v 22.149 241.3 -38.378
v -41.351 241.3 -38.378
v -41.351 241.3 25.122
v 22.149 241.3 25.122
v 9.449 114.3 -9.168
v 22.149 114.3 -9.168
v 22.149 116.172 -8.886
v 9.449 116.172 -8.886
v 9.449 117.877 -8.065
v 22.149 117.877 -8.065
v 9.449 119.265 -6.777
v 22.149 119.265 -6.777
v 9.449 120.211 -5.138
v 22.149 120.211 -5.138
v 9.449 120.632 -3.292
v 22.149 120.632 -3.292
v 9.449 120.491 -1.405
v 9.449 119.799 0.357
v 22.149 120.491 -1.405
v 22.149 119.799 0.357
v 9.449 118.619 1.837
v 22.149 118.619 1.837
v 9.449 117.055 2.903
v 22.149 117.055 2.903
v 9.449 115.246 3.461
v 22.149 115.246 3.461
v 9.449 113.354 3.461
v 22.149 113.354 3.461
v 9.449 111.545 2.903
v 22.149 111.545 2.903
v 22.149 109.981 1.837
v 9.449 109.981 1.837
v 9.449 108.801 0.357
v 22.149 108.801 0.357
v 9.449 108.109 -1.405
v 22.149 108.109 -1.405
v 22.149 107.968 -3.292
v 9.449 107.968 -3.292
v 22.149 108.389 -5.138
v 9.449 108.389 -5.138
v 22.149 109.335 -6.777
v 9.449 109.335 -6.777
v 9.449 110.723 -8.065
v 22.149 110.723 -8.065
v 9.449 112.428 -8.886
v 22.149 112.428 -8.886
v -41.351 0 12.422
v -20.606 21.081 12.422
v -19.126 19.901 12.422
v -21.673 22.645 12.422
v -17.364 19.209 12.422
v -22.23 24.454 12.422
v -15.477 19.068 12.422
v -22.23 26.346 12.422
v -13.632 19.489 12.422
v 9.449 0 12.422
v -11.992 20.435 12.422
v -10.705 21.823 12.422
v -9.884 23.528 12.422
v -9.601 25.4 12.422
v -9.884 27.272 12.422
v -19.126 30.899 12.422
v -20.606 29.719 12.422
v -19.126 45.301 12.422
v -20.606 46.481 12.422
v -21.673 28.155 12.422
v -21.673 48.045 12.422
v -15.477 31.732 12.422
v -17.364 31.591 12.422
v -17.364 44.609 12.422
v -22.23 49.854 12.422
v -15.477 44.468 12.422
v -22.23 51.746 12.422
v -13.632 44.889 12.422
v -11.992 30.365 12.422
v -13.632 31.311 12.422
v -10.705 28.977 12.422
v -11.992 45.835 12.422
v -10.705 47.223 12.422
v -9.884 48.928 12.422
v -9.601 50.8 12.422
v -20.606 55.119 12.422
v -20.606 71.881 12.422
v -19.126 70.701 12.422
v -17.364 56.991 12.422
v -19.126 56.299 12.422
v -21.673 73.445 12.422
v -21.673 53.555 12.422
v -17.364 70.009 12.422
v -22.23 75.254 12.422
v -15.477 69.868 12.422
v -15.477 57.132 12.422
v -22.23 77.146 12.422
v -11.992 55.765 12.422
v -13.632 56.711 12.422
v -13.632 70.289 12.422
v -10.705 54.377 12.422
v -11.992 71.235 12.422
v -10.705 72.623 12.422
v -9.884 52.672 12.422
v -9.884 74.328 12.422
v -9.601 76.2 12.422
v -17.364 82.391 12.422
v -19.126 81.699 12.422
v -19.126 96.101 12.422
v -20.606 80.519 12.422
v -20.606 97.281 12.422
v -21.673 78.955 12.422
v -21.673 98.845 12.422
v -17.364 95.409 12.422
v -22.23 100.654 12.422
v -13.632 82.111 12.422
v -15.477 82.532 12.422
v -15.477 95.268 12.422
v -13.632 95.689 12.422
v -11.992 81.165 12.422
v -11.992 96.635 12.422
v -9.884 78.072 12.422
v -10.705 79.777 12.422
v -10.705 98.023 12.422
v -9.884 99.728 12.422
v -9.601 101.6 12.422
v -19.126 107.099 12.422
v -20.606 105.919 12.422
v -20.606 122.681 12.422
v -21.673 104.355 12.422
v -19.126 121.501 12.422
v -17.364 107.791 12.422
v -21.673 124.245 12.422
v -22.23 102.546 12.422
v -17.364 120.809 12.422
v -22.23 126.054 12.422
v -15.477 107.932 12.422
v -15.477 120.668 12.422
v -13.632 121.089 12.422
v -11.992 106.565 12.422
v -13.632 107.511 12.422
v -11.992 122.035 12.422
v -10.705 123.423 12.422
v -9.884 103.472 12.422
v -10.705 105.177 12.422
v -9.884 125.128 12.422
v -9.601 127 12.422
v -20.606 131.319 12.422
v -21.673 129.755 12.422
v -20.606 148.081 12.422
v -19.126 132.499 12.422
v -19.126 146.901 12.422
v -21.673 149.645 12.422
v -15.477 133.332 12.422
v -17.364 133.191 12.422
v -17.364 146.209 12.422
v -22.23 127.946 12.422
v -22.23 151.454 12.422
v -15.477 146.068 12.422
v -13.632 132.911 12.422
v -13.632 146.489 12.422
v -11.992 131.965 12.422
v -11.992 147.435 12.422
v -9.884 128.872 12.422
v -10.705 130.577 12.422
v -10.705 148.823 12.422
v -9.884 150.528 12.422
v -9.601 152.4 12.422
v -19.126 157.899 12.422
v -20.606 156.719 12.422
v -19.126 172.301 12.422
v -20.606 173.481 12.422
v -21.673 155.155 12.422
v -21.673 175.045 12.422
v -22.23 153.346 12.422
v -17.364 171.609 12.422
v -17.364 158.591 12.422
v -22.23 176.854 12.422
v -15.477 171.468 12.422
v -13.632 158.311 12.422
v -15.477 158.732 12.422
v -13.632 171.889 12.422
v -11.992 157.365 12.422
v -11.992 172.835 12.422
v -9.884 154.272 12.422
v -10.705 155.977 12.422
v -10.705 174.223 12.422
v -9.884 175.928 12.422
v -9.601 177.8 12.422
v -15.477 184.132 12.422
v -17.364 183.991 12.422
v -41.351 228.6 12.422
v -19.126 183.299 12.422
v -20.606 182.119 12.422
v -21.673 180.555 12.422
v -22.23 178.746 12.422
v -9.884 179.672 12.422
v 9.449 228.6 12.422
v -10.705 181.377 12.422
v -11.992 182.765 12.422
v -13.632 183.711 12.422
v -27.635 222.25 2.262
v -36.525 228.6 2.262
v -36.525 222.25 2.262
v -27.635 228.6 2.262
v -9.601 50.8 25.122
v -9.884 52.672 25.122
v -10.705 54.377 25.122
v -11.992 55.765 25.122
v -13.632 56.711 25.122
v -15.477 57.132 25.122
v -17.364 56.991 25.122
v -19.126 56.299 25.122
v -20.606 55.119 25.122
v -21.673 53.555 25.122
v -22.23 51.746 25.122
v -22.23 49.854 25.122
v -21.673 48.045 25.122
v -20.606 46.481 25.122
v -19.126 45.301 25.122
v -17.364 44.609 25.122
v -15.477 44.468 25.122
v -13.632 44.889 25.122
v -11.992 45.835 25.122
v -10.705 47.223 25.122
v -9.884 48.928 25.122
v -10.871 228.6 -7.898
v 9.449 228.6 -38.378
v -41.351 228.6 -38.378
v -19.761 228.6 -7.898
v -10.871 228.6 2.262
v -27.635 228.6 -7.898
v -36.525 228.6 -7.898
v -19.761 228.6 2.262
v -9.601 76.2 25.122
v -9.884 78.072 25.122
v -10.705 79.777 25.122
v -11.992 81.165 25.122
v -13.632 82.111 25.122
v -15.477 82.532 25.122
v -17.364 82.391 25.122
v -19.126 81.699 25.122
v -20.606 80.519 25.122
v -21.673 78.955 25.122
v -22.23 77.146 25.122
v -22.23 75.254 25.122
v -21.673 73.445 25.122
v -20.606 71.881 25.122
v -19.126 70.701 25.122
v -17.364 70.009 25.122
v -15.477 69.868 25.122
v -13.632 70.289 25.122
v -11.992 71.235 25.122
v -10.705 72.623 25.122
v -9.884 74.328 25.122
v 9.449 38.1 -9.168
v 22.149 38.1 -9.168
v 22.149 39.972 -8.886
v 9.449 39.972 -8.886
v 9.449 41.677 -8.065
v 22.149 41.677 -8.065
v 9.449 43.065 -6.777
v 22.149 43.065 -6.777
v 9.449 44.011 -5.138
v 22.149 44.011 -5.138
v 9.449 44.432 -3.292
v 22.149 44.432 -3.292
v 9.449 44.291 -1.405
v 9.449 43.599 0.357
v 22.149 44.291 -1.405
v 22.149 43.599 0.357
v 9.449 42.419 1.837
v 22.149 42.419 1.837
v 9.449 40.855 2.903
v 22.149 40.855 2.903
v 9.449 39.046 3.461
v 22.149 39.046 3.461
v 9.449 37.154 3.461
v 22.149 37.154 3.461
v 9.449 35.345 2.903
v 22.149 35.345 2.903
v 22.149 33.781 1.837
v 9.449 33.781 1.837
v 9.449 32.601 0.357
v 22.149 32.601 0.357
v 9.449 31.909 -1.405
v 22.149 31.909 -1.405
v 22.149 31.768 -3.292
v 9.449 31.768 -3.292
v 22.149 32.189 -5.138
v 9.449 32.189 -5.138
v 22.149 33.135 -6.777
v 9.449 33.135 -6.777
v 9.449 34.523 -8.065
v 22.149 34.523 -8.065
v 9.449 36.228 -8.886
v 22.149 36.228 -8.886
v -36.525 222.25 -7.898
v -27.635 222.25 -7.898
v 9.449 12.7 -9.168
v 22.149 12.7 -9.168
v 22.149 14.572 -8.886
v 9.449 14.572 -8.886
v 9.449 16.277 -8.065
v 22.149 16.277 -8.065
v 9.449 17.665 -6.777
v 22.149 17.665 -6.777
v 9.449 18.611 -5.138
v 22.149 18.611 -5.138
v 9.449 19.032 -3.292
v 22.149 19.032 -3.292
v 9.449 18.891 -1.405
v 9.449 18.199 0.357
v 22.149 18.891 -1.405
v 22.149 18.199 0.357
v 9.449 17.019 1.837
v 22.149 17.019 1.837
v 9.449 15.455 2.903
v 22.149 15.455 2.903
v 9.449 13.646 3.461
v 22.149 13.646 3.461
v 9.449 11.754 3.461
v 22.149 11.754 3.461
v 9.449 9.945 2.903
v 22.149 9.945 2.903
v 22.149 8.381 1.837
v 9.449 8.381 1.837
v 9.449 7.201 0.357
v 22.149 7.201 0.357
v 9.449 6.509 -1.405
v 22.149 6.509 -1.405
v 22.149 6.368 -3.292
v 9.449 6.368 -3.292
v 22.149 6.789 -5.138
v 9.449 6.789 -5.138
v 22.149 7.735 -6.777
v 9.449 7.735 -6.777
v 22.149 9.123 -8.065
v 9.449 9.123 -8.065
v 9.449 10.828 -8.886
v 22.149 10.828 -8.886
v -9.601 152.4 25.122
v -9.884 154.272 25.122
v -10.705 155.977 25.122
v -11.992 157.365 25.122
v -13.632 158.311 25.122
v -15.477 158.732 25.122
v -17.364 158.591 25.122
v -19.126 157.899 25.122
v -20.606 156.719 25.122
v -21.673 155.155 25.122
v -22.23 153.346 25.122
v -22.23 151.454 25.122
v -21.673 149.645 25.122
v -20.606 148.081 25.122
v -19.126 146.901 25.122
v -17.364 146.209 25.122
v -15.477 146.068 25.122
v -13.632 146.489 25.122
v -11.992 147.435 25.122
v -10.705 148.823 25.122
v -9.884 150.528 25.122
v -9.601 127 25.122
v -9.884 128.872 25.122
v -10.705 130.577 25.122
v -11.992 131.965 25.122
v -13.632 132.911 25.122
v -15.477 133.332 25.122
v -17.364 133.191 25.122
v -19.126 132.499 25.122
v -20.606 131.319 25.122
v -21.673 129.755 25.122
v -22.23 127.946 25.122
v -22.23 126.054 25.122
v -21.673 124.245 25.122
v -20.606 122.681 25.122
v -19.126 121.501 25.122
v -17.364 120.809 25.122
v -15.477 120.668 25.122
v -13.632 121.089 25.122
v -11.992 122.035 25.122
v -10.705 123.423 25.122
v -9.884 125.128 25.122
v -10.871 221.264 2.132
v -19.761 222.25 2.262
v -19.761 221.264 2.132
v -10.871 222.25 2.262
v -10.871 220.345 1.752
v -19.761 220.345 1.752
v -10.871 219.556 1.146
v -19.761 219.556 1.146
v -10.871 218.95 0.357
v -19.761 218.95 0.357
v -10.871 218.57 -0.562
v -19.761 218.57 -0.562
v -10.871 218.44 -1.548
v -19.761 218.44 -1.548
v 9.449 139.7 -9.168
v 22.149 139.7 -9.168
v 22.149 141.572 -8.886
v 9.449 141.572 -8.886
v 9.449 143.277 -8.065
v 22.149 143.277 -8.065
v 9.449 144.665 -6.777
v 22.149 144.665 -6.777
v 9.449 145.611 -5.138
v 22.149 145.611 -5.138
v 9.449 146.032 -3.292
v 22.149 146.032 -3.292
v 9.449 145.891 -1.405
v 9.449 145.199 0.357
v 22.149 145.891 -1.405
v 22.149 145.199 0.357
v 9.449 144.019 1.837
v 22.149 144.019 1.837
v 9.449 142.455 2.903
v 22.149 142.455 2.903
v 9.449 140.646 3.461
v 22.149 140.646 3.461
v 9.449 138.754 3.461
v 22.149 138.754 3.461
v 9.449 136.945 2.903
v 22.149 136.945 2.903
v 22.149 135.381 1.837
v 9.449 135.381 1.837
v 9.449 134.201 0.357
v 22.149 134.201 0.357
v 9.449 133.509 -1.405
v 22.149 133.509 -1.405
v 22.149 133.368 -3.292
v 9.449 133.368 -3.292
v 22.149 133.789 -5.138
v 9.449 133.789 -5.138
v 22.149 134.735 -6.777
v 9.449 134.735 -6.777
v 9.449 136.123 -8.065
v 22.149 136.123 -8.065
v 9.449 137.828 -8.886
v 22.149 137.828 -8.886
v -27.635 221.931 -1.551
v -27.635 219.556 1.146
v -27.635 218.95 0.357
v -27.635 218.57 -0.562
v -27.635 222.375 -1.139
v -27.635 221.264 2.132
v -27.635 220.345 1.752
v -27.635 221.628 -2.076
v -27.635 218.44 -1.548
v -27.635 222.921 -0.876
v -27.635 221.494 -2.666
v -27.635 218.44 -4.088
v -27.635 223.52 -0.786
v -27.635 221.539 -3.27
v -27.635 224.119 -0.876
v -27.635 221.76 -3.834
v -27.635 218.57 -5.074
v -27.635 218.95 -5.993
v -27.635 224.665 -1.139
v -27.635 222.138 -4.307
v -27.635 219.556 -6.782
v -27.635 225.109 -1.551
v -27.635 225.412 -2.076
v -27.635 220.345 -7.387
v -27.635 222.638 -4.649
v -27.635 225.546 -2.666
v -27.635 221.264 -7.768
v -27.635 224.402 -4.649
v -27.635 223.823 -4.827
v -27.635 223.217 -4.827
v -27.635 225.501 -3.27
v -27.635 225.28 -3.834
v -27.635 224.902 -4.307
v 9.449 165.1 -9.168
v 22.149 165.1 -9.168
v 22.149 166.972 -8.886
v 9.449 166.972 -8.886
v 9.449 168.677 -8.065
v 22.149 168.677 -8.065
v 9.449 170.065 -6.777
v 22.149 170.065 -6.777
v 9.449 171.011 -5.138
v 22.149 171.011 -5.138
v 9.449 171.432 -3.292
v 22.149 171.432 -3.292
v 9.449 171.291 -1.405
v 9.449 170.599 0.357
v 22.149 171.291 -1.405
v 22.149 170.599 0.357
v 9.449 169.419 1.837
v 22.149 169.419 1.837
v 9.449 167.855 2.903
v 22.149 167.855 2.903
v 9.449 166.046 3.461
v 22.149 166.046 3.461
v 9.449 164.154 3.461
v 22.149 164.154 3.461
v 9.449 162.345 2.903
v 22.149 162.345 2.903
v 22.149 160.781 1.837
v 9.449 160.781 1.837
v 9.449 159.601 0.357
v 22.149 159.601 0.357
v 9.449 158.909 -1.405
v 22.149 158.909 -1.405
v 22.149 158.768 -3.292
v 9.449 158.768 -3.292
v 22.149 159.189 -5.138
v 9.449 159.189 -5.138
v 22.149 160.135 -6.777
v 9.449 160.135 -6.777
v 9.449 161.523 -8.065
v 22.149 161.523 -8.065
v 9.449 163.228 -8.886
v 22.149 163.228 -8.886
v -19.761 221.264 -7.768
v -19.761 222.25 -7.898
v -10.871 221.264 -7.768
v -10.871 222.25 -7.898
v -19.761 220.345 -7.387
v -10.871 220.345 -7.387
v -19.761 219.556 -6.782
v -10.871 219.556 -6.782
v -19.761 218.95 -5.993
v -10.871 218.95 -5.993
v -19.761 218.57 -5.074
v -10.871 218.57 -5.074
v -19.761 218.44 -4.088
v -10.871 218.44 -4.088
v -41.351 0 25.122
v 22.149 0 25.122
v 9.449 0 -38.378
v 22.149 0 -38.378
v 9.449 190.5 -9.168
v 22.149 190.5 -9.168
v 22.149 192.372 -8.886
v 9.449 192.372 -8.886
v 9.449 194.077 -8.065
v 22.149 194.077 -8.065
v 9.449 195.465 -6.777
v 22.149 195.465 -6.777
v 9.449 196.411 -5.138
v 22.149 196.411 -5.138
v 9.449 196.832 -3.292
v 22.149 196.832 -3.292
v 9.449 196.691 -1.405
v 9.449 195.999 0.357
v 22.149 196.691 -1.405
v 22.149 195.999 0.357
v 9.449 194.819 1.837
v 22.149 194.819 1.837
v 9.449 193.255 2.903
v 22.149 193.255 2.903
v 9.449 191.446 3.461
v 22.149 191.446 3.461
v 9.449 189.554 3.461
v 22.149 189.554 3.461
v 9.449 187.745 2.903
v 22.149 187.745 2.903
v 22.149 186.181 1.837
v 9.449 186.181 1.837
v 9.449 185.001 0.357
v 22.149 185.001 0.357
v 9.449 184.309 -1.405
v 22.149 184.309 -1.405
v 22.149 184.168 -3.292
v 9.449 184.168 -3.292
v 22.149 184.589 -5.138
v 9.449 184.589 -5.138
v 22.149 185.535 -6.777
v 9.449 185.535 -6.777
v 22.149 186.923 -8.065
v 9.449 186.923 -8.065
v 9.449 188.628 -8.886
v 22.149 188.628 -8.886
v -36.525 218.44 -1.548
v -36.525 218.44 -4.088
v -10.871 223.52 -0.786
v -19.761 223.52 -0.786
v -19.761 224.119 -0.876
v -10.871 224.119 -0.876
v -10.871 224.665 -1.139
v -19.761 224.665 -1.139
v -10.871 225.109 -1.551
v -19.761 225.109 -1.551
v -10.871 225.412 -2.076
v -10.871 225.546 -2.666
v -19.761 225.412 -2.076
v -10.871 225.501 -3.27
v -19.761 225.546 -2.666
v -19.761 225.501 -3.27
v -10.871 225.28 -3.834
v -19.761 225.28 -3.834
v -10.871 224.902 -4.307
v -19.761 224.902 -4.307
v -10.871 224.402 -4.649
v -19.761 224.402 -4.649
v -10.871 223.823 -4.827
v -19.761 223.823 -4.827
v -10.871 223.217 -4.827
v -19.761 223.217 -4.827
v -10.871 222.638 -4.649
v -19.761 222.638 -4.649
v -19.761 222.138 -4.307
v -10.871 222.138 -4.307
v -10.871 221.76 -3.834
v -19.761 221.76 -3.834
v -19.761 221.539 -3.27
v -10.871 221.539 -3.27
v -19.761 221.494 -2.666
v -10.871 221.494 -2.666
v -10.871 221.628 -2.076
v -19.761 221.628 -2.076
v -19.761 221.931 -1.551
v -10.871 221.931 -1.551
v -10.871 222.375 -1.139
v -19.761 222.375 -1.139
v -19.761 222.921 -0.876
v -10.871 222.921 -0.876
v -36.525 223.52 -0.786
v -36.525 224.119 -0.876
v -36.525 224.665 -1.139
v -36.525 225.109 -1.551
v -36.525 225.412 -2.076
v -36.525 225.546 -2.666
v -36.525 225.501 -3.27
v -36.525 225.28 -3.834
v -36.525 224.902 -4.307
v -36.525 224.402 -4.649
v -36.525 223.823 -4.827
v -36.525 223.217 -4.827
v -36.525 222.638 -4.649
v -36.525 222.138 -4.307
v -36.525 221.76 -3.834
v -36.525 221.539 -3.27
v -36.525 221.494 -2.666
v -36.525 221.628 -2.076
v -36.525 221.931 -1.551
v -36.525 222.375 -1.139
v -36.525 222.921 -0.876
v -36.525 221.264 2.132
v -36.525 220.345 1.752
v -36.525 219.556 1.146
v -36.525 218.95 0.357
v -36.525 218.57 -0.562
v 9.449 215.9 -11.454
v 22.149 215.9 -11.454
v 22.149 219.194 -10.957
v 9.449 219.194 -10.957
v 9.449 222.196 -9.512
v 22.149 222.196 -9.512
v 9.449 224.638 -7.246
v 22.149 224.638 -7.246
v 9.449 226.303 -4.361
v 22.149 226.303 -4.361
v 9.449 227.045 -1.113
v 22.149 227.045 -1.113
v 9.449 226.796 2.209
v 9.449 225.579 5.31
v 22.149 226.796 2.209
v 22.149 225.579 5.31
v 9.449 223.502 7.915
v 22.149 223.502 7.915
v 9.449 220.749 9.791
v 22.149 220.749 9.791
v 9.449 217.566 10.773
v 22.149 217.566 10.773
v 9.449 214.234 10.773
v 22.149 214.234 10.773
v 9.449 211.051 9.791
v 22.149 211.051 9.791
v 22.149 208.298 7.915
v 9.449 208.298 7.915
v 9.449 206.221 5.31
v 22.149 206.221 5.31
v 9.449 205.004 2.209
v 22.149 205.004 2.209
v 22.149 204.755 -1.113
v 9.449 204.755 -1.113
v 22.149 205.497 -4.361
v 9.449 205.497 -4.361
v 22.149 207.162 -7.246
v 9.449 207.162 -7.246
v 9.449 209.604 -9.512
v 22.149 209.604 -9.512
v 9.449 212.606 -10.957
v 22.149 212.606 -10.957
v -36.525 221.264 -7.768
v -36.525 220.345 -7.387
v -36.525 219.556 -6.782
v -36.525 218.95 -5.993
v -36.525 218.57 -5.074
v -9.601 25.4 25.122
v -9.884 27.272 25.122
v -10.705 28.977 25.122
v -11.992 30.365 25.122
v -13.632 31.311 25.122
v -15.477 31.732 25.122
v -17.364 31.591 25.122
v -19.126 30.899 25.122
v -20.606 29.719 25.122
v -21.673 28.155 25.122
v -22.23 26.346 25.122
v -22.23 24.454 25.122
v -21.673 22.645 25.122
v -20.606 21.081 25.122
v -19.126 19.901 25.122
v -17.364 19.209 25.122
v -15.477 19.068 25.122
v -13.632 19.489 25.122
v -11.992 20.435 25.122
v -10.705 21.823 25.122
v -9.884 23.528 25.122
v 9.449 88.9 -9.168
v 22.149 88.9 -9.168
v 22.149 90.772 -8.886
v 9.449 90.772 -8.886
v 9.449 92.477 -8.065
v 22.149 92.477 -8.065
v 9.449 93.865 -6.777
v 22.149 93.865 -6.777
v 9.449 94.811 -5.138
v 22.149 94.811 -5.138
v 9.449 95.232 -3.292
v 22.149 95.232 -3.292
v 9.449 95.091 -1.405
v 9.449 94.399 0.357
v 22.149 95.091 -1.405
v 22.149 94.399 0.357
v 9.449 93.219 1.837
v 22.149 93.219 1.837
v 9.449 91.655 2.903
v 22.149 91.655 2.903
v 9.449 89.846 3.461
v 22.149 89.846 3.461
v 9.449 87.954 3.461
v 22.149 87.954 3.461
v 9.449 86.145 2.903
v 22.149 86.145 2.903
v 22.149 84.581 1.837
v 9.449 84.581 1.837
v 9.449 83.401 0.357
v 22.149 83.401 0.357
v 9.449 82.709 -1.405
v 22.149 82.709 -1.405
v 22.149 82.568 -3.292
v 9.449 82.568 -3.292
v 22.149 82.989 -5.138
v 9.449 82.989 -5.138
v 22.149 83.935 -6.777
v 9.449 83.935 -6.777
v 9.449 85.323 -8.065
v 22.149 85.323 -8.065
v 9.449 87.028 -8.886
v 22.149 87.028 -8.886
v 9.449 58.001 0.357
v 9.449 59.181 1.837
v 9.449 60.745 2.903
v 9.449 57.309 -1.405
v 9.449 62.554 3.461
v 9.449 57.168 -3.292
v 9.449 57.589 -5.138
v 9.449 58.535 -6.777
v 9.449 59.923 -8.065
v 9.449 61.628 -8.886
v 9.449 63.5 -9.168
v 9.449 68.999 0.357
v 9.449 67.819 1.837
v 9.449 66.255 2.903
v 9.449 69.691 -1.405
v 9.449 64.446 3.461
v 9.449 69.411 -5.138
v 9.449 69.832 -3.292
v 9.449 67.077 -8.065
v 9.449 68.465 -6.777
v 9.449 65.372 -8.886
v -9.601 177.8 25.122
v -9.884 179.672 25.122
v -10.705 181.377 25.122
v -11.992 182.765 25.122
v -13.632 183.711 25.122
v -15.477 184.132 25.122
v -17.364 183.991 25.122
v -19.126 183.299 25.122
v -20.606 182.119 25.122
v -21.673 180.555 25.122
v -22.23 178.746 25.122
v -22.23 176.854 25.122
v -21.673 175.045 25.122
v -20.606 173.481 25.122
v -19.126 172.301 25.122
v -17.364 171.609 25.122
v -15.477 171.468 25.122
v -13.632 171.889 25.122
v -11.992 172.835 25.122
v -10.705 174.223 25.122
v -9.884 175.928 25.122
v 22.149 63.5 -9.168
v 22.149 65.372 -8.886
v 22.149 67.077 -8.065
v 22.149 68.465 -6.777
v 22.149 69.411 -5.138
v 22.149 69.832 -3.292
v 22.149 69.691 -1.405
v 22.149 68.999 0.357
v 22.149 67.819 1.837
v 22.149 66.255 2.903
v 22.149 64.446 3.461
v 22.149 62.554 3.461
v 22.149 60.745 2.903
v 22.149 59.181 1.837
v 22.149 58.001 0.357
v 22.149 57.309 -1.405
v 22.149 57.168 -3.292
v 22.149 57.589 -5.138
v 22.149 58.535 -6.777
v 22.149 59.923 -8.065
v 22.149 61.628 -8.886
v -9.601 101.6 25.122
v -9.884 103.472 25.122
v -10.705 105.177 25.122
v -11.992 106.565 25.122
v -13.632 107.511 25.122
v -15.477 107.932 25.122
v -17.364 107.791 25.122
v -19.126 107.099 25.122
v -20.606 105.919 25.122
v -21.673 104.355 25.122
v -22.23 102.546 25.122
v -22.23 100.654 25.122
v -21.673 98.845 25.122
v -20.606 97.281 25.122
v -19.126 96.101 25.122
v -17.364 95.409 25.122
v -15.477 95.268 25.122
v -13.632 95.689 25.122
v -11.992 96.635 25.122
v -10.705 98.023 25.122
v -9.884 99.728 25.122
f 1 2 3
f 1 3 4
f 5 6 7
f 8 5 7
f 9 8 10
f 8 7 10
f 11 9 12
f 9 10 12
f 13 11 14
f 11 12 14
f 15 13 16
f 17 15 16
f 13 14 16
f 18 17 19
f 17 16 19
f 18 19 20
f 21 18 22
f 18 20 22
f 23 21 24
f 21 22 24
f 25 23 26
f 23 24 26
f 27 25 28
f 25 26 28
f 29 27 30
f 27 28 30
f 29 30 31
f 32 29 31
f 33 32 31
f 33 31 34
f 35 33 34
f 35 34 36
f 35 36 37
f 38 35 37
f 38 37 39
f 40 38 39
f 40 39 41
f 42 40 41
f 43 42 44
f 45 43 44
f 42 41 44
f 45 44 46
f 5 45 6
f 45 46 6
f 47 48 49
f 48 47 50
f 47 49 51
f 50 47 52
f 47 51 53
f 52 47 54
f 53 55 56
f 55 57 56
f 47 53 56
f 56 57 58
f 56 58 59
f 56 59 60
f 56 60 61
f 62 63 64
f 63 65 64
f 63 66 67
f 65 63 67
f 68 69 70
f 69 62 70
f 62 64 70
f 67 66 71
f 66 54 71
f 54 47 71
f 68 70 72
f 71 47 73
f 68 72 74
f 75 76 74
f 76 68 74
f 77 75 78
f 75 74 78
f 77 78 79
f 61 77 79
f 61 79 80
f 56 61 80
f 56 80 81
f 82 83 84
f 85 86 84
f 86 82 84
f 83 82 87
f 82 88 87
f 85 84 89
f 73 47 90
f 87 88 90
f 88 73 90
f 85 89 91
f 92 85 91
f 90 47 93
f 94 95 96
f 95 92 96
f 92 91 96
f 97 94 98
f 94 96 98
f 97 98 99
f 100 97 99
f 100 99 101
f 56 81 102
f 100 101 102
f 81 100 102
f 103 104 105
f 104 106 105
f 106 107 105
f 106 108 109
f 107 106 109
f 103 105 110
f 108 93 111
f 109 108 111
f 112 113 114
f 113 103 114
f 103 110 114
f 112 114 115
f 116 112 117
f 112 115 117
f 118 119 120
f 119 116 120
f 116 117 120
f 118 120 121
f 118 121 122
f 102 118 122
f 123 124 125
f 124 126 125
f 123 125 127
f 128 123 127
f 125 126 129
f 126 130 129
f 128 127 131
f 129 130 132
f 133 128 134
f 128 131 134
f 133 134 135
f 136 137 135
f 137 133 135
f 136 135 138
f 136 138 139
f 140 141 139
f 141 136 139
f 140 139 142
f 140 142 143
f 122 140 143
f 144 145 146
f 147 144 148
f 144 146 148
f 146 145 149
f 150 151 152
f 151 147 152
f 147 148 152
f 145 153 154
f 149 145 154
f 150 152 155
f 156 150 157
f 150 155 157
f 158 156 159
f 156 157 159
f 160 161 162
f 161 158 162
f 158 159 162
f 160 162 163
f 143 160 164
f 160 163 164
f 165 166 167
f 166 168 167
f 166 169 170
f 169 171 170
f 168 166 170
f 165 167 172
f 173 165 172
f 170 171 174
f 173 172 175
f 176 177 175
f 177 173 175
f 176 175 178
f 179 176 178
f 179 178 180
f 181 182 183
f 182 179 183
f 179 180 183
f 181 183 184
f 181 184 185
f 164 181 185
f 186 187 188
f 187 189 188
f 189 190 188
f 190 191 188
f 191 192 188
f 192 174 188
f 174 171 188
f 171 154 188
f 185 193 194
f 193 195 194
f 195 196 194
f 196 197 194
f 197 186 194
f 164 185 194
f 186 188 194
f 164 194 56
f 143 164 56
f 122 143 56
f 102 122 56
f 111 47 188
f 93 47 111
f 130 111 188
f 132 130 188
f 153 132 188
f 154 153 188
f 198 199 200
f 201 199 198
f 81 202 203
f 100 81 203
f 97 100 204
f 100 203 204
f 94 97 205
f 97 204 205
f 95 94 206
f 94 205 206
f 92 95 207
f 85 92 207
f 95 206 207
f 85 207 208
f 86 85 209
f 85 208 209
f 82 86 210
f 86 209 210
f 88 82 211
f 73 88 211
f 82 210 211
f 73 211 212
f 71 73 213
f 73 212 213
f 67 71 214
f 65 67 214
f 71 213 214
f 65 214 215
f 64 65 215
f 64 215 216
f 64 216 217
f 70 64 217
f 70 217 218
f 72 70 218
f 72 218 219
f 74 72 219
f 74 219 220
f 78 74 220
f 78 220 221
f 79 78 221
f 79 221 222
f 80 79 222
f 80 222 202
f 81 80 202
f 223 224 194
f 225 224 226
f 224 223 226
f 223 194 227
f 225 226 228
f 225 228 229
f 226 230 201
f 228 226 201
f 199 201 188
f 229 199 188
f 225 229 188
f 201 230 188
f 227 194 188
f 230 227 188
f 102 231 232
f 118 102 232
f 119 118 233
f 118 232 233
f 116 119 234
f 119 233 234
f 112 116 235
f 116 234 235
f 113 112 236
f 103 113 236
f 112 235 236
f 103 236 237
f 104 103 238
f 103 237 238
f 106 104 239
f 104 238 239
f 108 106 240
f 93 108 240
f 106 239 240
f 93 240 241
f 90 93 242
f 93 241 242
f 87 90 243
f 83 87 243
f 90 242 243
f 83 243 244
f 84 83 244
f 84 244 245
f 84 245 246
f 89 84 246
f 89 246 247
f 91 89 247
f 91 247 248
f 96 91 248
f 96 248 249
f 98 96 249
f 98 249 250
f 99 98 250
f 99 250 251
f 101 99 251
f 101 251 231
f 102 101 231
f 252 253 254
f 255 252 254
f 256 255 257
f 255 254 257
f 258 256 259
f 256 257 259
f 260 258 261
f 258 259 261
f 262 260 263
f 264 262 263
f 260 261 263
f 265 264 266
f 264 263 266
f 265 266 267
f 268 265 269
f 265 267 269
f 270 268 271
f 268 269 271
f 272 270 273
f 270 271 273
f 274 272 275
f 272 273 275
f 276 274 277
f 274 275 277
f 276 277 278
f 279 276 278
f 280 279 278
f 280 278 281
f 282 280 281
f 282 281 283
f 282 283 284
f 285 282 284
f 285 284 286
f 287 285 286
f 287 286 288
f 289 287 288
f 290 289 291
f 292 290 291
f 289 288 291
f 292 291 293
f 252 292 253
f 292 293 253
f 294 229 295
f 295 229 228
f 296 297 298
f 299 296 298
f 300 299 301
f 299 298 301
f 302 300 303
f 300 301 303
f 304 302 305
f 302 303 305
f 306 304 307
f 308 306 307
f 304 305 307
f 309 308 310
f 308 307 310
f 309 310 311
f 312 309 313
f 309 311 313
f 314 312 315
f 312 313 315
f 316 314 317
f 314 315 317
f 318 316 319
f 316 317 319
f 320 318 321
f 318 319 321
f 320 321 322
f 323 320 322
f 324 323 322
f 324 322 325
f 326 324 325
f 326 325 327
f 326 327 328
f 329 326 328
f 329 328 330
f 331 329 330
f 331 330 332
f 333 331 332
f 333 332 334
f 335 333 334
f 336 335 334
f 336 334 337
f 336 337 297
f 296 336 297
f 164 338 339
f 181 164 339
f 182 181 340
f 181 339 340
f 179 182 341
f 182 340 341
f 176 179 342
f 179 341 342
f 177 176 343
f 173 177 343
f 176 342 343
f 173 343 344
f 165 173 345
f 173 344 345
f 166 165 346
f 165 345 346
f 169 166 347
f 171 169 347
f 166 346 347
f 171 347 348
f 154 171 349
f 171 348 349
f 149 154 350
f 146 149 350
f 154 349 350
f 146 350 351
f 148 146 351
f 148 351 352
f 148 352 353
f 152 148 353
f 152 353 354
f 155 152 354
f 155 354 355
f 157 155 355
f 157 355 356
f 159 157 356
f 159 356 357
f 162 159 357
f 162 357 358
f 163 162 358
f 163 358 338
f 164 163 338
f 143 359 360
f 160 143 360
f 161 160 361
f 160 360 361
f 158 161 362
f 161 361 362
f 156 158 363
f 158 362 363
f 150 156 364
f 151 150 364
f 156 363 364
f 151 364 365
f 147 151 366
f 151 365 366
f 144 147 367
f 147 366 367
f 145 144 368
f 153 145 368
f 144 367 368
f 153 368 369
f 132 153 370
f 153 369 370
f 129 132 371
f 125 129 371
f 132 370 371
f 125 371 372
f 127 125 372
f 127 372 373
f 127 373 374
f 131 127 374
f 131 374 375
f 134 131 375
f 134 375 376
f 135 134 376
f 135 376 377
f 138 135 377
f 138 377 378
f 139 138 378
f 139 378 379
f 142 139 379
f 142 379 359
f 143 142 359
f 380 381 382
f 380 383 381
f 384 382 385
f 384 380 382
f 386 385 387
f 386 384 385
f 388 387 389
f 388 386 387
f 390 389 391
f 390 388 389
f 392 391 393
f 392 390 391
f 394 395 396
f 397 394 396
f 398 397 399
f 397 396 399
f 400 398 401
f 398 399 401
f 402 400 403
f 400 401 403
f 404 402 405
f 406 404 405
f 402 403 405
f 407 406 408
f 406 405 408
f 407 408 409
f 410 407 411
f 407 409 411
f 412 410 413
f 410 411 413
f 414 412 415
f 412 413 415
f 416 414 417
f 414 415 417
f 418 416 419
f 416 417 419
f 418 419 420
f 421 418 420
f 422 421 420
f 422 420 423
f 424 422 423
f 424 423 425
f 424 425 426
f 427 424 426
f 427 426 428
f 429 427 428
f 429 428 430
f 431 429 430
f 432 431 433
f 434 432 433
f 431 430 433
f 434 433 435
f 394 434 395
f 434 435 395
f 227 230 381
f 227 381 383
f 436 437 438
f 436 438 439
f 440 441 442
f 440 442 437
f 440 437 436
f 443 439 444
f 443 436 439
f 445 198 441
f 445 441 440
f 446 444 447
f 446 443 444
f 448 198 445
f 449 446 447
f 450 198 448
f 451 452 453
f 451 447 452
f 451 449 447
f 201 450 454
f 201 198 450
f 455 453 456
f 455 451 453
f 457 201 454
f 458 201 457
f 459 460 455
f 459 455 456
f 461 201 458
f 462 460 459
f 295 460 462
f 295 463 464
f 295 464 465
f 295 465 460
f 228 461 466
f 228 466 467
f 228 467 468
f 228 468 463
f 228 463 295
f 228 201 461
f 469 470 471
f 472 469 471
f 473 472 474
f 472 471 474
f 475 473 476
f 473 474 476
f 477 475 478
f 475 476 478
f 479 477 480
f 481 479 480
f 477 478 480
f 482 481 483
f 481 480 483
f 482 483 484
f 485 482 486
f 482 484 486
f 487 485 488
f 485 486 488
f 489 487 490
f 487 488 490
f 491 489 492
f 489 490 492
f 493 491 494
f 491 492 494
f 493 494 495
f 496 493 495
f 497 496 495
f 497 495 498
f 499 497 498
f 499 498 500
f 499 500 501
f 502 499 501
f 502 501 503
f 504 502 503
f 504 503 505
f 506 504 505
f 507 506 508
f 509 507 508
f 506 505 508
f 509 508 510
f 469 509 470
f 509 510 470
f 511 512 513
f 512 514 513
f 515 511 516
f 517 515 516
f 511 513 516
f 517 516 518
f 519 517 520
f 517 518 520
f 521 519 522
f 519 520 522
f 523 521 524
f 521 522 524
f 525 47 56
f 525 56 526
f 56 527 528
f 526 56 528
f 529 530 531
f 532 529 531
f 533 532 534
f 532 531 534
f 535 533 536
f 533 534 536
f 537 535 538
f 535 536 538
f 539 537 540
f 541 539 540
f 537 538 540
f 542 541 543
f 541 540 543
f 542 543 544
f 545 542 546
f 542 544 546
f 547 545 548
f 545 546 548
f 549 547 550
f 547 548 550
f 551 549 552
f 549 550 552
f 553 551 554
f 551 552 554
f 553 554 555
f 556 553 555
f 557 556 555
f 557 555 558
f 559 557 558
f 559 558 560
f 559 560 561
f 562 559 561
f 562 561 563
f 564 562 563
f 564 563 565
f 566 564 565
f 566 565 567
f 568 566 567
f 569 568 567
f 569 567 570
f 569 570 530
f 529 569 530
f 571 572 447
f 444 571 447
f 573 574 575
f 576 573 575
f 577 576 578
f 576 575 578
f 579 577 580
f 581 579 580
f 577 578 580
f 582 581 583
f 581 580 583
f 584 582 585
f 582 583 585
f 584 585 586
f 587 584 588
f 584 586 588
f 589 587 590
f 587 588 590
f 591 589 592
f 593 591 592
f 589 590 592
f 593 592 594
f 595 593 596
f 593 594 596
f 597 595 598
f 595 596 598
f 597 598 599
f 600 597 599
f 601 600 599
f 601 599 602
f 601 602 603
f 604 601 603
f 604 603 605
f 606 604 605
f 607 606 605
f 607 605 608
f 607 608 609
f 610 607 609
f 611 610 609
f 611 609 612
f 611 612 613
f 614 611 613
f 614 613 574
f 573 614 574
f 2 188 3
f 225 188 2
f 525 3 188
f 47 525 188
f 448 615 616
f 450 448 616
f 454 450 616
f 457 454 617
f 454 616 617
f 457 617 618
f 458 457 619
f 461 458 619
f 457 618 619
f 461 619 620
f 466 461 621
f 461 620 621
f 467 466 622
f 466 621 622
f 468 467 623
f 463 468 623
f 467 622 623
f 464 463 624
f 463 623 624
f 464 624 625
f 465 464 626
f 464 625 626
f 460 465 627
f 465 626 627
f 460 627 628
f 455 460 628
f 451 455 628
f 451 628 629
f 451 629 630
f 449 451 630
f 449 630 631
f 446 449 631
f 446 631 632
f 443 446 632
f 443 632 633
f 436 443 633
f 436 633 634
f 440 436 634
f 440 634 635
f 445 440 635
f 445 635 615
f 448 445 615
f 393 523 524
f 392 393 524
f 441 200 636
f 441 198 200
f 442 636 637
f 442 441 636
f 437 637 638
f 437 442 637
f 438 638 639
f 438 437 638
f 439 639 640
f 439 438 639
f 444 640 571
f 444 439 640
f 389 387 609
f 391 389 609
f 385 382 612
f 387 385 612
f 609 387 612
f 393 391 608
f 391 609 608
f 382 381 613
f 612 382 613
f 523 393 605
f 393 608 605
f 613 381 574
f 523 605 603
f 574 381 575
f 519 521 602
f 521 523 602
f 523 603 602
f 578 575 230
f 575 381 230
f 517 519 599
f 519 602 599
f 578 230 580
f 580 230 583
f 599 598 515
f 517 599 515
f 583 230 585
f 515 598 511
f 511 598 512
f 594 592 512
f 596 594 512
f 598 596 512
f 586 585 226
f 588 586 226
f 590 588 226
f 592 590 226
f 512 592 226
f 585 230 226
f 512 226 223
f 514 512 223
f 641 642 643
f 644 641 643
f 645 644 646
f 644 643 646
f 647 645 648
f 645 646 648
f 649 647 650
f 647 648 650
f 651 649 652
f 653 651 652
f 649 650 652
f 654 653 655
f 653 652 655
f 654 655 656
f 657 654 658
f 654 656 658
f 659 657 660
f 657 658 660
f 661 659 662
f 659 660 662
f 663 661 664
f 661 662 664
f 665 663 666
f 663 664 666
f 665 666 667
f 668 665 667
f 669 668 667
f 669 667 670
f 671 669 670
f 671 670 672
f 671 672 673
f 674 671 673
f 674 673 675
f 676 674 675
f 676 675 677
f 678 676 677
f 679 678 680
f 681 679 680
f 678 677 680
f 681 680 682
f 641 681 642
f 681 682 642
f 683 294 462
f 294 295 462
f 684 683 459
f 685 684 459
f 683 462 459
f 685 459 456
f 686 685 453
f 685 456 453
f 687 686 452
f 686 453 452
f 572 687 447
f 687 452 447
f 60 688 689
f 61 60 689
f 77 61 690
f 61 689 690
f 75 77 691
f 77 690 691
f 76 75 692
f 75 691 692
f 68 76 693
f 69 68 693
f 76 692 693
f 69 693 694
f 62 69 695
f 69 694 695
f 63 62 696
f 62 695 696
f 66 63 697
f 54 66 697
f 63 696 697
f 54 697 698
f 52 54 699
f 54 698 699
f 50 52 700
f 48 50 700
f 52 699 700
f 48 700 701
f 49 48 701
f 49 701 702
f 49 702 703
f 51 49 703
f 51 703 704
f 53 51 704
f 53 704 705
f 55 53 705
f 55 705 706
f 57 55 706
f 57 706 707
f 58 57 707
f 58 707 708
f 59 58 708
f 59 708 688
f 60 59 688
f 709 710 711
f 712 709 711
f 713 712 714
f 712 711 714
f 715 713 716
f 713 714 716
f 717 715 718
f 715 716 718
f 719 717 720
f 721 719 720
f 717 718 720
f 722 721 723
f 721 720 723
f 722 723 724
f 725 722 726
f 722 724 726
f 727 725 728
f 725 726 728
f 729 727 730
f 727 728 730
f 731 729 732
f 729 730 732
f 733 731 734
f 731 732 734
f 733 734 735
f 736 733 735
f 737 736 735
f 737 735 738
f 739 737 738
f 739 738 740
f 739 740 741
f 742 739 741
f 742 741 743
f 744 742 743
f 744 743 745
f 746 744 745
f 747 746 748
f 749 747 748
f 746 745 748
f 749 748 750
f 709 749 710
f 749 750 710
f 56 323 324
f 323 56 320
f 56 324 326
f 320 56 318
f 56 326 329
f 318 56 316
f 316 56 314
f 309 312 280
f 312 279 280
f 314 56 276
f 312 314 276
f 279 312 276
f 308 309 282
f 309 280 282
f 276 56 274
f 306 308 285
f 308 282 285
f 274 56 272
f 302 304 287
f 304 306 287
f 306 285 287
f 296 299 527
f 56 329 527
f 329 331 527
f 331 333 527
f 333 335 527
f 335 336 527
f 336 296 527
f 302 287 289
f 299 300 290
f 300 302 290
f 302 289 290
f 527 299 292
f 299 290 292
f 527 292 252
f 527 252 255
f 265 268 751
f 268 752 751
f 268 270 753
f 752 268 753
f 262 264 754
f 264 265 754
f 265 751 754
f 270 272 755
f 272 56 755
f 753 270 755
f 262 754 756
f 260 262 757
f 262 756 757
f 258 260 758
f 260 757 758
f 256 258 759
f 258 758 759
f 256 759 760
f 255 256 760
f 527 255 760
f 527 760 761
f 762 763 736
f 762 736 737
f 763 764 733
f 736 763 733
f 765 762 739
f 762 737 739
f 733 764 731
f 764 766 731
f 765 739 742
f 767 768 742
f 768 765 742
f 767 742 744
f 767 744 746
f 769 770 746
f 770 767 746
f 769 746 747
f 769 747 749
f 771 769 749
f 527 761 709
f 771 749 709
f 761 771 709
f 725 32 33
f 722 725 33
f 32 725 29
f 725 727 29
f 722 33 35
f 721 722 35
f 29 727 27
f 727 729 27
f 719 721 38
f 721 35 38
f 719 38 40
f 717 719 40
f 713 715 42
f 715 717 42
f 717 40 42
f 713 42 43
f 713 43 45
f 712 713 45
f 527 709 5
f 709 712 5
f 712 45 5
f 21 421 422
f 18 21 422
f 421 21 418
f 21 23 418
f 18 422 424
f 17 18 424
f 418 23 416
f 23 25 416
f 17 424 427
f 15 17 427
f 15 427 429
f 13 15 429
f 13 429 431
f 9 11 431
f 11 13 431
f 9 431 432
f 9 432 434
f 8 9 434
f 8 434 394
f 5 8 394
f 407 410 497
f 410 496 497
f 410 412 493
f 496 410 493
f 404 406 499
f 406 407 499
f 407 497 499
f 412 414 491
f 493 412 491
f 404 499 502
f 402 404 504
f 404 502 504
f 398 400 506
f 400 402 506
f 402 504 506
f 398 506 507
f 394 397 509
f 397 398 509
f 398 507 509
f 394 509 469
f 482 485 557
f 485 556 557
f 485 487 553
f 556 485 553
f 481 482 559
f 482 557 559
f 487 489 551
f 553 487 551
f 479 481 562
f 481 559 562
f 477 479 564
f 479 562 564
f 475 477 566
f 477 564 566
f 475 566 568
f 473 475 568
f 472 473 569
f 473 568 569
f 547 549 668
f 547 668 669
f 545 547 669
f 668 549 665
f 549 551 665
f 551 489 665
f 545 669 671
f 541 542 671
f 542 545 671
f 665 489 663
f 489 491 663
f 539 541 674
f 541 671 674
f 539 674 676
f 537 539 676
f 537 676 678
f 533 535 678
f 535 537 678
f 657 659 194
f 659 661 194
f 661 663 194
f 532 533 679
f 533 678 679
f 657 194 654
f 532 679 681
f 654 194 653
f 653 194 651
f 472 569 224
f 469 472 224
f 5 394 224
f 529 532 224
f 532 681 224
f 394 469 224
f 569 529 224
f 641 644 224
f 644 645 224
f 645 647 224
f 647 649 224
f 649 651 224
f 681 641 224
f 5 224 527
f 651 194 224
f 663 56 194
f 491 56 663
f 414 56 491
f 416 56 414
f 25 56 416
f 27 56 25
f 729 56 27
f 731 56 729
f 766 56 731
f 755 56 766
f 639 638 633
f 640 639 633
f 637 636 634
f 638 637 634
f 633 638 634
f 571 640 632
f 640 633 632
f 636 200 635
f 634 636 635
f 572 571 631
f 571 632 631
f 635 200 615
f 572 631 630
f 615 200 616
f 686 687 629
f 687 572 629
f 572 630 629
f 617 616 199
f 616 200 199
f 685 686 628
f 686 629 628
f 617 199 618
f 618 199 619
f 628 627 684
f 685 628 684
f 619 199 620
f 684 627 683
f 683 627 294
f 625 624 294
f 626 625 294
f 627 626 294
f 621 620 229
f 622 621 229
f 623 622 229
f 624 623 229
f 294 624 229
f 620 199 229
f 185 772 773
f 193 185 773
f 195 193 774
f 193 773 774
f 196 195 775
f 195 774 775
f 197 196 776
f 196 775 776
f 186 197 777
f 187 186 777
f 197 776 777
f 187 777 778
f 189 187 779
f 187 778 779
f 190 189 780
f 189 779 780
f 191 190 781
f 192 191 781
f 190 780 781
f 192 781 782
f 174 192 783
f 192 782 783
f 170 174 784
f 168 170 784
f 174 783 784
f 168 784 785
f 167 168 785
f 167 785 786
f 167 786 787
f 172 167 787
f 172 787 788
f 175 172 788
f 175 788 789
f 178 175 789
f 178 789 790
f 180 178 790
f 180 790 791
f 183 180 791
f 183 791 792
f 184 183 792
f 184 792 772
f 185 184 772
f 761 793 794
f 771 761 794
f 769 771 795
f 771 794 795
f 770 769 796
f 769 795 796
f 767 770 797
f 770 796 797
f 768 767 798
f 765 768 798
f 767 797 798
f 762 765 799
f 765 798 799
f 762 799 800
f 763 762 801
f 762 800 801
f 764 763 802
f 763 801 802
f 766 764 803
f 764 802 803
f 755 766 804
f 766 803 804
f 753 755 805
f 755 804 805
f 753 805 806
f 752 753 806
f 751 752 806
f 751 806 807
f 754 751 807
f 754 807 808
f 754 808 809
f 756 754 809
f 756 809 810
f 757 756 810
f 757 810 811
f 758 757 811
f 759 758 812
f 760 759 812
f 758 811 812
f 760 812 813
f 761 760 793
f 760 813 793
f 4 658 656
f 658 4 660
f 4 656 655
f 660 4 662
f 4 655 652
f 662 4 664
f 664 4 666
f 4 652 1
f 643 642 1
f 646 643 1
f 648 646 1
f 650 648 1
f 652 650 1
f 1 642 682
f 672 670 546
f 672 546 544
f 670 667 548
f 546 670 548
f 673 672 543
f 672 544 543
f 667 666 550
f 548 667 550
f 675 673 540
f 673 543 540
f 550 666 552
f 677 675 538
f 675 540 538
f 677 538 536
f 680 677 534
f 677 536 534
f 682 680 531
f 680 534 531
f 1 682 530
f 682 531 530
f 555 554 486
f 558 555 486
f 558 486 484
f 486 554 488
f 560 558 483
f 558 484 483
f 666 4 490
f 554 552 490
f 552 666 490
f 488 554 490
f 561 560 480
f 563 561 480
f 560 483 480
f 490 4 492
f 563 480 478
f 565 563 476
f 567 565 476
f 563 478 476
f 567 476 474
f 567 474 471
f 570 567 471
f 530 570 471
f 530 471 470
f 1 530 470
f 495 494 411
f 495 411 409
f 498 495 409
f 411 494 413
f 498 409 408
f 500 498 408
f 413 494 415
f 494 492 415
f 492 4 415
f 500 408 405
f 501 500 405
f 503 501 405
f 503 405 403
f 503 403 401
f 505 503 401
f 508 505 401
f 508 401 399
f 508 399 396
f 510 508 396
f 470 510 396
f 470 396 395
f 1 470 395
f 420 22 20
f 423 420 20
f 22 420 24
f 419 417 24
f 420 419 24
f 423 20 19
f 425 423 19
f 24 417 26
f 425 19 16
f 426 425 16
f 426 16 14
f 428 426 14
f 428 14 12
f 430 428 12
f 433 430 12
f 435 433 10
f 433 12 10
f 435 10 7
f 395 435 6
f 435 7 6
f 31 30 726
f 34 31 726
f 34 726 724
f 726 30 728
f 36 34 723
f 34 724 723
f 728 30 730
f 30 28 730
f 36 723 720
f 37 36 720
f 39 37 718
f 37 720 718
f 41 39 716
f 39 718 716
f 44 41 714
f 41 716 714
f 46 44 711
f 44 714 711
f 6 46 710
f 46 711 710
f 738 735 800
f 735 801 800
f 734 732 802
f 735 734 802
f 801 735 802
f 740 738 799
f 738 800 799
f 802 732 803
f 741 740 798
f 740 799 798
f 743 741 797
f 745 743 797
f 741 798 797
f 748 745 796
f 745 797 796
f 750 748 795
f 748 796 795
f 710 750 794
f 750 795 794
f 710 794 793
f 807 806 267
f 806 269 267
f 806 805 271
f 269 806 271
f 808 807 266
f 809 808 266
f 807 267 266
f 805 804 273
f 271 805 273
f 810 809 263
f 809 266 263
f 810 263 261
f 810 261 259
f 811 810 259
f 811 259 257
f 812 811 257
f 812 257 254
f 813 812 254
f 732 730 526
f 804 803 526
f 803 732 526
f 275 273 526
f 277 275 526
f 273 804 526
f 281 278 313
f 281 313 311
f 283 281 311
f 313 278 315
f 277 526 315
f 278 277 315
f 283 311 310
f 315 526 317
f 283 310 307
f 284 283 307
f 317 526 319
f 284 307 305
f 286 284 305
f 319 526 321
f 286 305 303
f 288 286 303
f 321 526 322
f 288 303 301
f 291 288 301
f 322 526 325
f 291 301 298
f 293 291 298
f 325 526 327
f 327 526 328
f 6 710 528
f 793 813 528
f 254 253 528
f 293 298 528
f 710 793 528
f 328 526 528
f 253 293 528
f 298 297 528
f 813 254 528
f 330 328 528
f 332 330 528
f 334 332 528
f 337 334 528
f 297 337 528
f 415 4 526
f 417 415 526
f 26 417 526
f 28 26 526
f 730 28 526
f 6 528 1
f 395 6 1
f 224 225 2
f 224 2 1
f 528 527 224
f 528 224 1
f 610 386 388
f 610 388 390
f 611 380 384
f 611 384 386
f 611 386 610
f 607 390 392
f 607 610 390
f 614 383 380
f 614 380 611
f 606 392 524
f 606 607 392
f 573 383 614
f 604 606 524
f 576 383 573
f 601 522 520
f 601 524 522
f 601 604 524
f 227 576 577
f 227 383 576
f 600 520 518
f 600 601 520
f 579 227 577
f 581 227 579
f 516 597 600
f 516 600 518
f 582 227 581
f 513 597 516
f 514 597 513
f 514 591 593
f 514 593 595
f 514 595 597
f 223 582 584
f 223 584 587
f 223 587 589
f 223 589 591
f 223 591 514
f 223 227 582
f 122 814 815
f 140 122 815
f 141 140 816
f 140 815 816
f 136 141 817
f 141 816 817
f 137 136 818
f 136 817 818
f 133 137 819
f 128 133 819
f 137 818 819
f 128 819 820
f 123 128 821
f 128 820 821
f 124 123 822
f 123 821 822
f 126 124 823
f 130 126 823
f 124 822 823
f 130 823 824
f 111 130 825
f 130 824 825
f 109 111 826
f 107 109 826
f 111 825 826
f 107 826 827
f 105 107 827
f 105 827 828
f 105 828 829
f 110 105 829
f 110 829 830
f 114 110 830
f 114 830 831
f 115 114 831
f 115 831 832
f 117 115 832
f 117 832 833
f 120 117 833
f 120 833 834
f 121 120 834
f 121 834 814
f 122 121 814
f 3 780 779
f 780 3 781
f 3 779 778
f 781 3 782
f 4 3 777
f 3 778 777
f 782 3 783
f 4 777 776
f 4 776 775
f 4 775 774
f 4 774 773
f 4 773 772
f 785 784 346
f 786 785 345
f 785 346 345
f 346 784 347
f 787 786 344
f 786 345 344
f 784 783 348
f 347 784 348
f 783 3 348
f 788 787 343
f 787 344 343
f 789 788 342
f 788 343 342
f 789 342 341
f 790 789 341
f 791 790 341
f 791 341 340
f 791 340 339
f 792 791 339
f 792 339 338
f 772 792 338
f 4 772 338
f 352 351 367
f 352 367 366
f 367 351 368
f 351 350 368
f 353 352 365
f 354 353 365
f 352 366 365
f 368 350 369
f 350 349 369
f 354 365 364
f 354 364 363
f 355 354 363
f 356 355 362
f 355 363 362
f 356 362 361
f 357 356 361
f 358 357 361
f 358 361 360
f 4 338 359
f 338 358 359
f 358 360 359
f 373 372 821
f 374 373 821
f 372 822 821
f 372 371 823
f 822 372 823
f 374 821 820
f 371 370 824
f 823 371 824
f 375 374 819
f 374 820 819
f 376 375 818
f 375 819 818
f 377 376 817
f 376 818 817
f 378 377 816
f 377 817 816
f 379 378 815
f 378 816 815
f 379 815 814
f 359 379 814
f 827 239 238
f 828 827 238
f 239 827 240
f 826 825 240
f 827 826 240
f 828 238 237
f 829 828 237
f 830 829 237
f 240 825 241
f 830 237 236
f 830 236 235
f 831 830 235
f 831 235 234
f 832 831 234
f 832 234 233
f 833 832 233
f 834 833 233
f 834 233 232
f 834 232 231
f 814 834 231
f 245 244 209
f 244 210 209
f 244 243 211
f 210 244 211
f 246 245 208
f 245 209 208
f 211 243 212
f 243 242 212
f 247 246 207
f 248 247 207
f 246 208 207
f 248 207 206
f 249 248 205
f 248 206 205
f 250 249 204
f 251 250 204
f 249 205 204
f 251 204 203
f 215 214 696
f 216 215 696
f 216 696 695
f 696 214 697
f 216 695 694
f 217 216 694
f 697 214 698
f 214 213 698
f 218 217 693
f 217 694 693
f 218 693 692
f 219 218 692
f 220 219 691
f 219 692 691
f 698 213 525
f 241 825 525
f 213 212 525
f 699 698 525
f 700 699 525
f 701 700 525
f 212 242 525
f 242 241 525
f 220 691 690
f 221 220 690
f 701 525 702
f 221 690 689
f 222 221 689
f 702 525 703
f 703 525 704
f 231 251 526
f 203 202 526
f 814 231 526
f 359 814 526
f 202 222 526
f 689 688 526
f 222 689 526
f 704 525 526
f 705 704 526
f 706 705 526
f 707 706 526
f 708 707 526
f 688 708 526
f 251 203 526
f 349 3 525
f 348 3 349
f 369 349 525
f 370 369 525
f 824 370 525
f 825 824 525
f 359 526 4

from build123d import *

# Parameters (mm, degrees)
SKETCH2_W           = 63.5
SKETCH2_H           = 63.5
BOSS_EXTRUDE1_DEPTH = 241.3
SKETCH4_W           = 50.8
SKETCH4_H           = 50.8
CUT_EXTRUDE1_DEPTH  = 95.25
SKETCH5_R           = 6.35
CUT_EXTRUDE2_DEPTH  = 64.5
SKETCH6_R           = 6.35
CUT_EXTRUDE3_DEPTH  = 12.7
CUT_EXTRUDE4_DEPTH  = 7.35
CUT_EXTRUDE6_START  = -31.75
CUT_EXTRUDE6_DEPTH  = 31.75
SKETCH37_W          = 8.89
SKETCH37_H          = 10.16
BOSS_EXTRUDE3_DEPTH = 10.16
SKETCH38_R          = 2.032
CUT_EXTRUDE8_DEPTH  = 58.674
FILLET4_R           = 3.81
SKETCH40_R          = 11.176
CUT_EXTRUDE10_DEPTH = 12.7


with BuildPart() as part:
    # Sketch2 → Boss-Extrude1 (new body)
    with BuildSketch(Plane(origin=(0, 0, 0), x_dir=(1, 0, 0), z_dir=(0, 1, 0))):
        with Locations((-9.601422319, 6.627899344)):
            Rectangle(SKETCH2_W, SKETCH2_H)
    extrude(amount=BOSS_EXTRUDE1_DEPTH)

    # Sketch4 → Cut-Extrude1 (cut, symmetric)
    with BuildSketch(Plane(origin=(0, 101.6, 0), x_dir=(1, 0, 0), z_dir=(0, 1, 0))):
        with Locations((-15.951422319, 12.977899344)):
            Rectangle(SKETCH4_W, SKETCH4_H)
    extrude(amount=CUT_EXTRUDE1_DEPTH, both=True, mode=Mode.SUBTRACT)

    # Sketch5 → Cut-Extrude2 (cut, through all)
    with BuildSketch(Plane.XY.offset(25.122100656)):
        with Locations((-15.951422319, 25.4)):
            Circle(SKETCH5_R)
        with Locations((-15.951422319, 50.8)):
            Circle(SKETCH5_R)
        with Locations((-15.951422319, 76.2)):
            Circle(SKETCH5_R)
        with Locations((-15.951422319, 101.6)):
            Circle(SKETCH5_R)
        with Locations((-15.951422319, 127)):
            Circle(SKETCH5_R)
        with Locations((-15.951422319, 152.4)):
            Circle(SKETCH5_R)
        with Locations((-15.951422319, 177.8)):
            Circle(SKETCH5_R)
    extrude(amount=-CUT_EXTRUDE2_DEPTH, mode=Mode.SUBTRACT)

    # Sketch6 → Cut-Extrude3 (cut)
    with BuildSketch(Plane(origin=(22.148577681, 0, 0), x_dir=(0, 0, -1), z_dir=(1, 0, 0))):
        with Locations((2.817899344, 12.7)):
            Circle(SKETCH6_R)
        with Locations((2.817899344, 38.1)):
            Circle(SKETCH6_R)
        with Locations((2.817899344, 63.5)):
            Circle(SKETCH6_R)
        with Locations((2.817899344, 88.9)):
            Circle(SKETCH6_R)
        with Locations((2.817899344, 114.3)):
            Circle(SKETCH6_R)
        with Locations((2.817899344, 139.7)):
            Circle(SKETCH6_R)
        with Locations((2.817899344, 165.1)):
            Circle(SKETCH6_R)
        with Locations((2.817899344, 190.5)):
            Circle(SKETCH6_R)
    extrude(amount=-CUT_EXTRUDE3_DEPTH, mode=Mode.SUBTRACT)

    # Sketch7 → Cut-Extrude4 (cut, through all)
    with BuildSketch(Plane(origin=(0, 6.35, 0), x_dir=(1, 0, 0), z_dir=(0, 1, 0))):
        Polygon((-41.351422319, 38.377899344), (9.448577681, 38.377899344), (9.448577681, 0.277899344), (9.448577681, -12.422100656), (-3.251422319, -12.422100656), (-41.351422319, -12.422100656), align=None)
    extrude(amount=-CUT_EXTRUDE4_DEPTH, mode=Mode.SUBTRACT)

    # Sketch34 → Cut-Extrude6 (cut)
    with BuildSketch(Plane.XZ.offset(-196.85).offset(CUT_EXTRUDE6_START)):
        Polygon((-3.251422319, 12.422100656), (9.448577681, 12.422100656), (9.448577681, -0.277899344), (9.448577681, -38.377899344), (-41.351422319, -38.377899344), (-41.351422319, 12.422100656), align=None)
    extrude(amount=CUT_EXTRUDE6_DEPTH, mode=Mode.SUBTRACT)

    # Sketch37 → Boss-Extrude3 (add)
    with BuildSketch(Plane(origin=(0, 228.6, 0), x_dir=(1, 0, 0), z_dir=(0, 1, 0))):
        with Locations((-32.080422319, 2.817899344)):
            Rectangle(SKETCH37_W, SKETCH37_H)
        with Locations((-15.316422319, 2.817899344)):
            Rectangle(SKETCH37_W, SKETCH37_H)
    extrude(amount=-BOSS_EXTRUDE3_DEPTH)

    # Sketch38 → Cut-Extrude8 (cut)
    with BuildSketch(Plane.ZY.offset(36.525422319)):
        with Locations((-2.817899344, 223.52)):
            Circle(SKETCH38_R)
    extrude(amount=-CUT_EXTRUDE8_DEPTH, mode=Mode.SUBTRACT)

    # Fillet4
    fillet4_edges = [part.edges().sort_by_distance(p)[0] for p in [
        (-32.080422319, 218.44, -7.897899344),
        (-32.080422319, 218.44, 2.262100656),
        (-15.316422319, 218.44, -7.897899344),
        (-15.316422319, 218.44, 2.262100656),
    ]]
    fillet(fillet4_edges, radius=FILLET4_R)

    # Sketch40 → Cut-Extrude10 (cut)
    with BuildSketch(Plane(origin=(22.148577681, 0, 0), x_dir=(0, 0, -1), z_dir=(1, 0, 0))):
        with Locations((0.277899344, 215.9)):
            Circle(SKETCH40_R)
    extrude(amount=-CUT_EXTRUDE10_DEPTH, mode=Mode.SUBTRACT)


solid = part.part
